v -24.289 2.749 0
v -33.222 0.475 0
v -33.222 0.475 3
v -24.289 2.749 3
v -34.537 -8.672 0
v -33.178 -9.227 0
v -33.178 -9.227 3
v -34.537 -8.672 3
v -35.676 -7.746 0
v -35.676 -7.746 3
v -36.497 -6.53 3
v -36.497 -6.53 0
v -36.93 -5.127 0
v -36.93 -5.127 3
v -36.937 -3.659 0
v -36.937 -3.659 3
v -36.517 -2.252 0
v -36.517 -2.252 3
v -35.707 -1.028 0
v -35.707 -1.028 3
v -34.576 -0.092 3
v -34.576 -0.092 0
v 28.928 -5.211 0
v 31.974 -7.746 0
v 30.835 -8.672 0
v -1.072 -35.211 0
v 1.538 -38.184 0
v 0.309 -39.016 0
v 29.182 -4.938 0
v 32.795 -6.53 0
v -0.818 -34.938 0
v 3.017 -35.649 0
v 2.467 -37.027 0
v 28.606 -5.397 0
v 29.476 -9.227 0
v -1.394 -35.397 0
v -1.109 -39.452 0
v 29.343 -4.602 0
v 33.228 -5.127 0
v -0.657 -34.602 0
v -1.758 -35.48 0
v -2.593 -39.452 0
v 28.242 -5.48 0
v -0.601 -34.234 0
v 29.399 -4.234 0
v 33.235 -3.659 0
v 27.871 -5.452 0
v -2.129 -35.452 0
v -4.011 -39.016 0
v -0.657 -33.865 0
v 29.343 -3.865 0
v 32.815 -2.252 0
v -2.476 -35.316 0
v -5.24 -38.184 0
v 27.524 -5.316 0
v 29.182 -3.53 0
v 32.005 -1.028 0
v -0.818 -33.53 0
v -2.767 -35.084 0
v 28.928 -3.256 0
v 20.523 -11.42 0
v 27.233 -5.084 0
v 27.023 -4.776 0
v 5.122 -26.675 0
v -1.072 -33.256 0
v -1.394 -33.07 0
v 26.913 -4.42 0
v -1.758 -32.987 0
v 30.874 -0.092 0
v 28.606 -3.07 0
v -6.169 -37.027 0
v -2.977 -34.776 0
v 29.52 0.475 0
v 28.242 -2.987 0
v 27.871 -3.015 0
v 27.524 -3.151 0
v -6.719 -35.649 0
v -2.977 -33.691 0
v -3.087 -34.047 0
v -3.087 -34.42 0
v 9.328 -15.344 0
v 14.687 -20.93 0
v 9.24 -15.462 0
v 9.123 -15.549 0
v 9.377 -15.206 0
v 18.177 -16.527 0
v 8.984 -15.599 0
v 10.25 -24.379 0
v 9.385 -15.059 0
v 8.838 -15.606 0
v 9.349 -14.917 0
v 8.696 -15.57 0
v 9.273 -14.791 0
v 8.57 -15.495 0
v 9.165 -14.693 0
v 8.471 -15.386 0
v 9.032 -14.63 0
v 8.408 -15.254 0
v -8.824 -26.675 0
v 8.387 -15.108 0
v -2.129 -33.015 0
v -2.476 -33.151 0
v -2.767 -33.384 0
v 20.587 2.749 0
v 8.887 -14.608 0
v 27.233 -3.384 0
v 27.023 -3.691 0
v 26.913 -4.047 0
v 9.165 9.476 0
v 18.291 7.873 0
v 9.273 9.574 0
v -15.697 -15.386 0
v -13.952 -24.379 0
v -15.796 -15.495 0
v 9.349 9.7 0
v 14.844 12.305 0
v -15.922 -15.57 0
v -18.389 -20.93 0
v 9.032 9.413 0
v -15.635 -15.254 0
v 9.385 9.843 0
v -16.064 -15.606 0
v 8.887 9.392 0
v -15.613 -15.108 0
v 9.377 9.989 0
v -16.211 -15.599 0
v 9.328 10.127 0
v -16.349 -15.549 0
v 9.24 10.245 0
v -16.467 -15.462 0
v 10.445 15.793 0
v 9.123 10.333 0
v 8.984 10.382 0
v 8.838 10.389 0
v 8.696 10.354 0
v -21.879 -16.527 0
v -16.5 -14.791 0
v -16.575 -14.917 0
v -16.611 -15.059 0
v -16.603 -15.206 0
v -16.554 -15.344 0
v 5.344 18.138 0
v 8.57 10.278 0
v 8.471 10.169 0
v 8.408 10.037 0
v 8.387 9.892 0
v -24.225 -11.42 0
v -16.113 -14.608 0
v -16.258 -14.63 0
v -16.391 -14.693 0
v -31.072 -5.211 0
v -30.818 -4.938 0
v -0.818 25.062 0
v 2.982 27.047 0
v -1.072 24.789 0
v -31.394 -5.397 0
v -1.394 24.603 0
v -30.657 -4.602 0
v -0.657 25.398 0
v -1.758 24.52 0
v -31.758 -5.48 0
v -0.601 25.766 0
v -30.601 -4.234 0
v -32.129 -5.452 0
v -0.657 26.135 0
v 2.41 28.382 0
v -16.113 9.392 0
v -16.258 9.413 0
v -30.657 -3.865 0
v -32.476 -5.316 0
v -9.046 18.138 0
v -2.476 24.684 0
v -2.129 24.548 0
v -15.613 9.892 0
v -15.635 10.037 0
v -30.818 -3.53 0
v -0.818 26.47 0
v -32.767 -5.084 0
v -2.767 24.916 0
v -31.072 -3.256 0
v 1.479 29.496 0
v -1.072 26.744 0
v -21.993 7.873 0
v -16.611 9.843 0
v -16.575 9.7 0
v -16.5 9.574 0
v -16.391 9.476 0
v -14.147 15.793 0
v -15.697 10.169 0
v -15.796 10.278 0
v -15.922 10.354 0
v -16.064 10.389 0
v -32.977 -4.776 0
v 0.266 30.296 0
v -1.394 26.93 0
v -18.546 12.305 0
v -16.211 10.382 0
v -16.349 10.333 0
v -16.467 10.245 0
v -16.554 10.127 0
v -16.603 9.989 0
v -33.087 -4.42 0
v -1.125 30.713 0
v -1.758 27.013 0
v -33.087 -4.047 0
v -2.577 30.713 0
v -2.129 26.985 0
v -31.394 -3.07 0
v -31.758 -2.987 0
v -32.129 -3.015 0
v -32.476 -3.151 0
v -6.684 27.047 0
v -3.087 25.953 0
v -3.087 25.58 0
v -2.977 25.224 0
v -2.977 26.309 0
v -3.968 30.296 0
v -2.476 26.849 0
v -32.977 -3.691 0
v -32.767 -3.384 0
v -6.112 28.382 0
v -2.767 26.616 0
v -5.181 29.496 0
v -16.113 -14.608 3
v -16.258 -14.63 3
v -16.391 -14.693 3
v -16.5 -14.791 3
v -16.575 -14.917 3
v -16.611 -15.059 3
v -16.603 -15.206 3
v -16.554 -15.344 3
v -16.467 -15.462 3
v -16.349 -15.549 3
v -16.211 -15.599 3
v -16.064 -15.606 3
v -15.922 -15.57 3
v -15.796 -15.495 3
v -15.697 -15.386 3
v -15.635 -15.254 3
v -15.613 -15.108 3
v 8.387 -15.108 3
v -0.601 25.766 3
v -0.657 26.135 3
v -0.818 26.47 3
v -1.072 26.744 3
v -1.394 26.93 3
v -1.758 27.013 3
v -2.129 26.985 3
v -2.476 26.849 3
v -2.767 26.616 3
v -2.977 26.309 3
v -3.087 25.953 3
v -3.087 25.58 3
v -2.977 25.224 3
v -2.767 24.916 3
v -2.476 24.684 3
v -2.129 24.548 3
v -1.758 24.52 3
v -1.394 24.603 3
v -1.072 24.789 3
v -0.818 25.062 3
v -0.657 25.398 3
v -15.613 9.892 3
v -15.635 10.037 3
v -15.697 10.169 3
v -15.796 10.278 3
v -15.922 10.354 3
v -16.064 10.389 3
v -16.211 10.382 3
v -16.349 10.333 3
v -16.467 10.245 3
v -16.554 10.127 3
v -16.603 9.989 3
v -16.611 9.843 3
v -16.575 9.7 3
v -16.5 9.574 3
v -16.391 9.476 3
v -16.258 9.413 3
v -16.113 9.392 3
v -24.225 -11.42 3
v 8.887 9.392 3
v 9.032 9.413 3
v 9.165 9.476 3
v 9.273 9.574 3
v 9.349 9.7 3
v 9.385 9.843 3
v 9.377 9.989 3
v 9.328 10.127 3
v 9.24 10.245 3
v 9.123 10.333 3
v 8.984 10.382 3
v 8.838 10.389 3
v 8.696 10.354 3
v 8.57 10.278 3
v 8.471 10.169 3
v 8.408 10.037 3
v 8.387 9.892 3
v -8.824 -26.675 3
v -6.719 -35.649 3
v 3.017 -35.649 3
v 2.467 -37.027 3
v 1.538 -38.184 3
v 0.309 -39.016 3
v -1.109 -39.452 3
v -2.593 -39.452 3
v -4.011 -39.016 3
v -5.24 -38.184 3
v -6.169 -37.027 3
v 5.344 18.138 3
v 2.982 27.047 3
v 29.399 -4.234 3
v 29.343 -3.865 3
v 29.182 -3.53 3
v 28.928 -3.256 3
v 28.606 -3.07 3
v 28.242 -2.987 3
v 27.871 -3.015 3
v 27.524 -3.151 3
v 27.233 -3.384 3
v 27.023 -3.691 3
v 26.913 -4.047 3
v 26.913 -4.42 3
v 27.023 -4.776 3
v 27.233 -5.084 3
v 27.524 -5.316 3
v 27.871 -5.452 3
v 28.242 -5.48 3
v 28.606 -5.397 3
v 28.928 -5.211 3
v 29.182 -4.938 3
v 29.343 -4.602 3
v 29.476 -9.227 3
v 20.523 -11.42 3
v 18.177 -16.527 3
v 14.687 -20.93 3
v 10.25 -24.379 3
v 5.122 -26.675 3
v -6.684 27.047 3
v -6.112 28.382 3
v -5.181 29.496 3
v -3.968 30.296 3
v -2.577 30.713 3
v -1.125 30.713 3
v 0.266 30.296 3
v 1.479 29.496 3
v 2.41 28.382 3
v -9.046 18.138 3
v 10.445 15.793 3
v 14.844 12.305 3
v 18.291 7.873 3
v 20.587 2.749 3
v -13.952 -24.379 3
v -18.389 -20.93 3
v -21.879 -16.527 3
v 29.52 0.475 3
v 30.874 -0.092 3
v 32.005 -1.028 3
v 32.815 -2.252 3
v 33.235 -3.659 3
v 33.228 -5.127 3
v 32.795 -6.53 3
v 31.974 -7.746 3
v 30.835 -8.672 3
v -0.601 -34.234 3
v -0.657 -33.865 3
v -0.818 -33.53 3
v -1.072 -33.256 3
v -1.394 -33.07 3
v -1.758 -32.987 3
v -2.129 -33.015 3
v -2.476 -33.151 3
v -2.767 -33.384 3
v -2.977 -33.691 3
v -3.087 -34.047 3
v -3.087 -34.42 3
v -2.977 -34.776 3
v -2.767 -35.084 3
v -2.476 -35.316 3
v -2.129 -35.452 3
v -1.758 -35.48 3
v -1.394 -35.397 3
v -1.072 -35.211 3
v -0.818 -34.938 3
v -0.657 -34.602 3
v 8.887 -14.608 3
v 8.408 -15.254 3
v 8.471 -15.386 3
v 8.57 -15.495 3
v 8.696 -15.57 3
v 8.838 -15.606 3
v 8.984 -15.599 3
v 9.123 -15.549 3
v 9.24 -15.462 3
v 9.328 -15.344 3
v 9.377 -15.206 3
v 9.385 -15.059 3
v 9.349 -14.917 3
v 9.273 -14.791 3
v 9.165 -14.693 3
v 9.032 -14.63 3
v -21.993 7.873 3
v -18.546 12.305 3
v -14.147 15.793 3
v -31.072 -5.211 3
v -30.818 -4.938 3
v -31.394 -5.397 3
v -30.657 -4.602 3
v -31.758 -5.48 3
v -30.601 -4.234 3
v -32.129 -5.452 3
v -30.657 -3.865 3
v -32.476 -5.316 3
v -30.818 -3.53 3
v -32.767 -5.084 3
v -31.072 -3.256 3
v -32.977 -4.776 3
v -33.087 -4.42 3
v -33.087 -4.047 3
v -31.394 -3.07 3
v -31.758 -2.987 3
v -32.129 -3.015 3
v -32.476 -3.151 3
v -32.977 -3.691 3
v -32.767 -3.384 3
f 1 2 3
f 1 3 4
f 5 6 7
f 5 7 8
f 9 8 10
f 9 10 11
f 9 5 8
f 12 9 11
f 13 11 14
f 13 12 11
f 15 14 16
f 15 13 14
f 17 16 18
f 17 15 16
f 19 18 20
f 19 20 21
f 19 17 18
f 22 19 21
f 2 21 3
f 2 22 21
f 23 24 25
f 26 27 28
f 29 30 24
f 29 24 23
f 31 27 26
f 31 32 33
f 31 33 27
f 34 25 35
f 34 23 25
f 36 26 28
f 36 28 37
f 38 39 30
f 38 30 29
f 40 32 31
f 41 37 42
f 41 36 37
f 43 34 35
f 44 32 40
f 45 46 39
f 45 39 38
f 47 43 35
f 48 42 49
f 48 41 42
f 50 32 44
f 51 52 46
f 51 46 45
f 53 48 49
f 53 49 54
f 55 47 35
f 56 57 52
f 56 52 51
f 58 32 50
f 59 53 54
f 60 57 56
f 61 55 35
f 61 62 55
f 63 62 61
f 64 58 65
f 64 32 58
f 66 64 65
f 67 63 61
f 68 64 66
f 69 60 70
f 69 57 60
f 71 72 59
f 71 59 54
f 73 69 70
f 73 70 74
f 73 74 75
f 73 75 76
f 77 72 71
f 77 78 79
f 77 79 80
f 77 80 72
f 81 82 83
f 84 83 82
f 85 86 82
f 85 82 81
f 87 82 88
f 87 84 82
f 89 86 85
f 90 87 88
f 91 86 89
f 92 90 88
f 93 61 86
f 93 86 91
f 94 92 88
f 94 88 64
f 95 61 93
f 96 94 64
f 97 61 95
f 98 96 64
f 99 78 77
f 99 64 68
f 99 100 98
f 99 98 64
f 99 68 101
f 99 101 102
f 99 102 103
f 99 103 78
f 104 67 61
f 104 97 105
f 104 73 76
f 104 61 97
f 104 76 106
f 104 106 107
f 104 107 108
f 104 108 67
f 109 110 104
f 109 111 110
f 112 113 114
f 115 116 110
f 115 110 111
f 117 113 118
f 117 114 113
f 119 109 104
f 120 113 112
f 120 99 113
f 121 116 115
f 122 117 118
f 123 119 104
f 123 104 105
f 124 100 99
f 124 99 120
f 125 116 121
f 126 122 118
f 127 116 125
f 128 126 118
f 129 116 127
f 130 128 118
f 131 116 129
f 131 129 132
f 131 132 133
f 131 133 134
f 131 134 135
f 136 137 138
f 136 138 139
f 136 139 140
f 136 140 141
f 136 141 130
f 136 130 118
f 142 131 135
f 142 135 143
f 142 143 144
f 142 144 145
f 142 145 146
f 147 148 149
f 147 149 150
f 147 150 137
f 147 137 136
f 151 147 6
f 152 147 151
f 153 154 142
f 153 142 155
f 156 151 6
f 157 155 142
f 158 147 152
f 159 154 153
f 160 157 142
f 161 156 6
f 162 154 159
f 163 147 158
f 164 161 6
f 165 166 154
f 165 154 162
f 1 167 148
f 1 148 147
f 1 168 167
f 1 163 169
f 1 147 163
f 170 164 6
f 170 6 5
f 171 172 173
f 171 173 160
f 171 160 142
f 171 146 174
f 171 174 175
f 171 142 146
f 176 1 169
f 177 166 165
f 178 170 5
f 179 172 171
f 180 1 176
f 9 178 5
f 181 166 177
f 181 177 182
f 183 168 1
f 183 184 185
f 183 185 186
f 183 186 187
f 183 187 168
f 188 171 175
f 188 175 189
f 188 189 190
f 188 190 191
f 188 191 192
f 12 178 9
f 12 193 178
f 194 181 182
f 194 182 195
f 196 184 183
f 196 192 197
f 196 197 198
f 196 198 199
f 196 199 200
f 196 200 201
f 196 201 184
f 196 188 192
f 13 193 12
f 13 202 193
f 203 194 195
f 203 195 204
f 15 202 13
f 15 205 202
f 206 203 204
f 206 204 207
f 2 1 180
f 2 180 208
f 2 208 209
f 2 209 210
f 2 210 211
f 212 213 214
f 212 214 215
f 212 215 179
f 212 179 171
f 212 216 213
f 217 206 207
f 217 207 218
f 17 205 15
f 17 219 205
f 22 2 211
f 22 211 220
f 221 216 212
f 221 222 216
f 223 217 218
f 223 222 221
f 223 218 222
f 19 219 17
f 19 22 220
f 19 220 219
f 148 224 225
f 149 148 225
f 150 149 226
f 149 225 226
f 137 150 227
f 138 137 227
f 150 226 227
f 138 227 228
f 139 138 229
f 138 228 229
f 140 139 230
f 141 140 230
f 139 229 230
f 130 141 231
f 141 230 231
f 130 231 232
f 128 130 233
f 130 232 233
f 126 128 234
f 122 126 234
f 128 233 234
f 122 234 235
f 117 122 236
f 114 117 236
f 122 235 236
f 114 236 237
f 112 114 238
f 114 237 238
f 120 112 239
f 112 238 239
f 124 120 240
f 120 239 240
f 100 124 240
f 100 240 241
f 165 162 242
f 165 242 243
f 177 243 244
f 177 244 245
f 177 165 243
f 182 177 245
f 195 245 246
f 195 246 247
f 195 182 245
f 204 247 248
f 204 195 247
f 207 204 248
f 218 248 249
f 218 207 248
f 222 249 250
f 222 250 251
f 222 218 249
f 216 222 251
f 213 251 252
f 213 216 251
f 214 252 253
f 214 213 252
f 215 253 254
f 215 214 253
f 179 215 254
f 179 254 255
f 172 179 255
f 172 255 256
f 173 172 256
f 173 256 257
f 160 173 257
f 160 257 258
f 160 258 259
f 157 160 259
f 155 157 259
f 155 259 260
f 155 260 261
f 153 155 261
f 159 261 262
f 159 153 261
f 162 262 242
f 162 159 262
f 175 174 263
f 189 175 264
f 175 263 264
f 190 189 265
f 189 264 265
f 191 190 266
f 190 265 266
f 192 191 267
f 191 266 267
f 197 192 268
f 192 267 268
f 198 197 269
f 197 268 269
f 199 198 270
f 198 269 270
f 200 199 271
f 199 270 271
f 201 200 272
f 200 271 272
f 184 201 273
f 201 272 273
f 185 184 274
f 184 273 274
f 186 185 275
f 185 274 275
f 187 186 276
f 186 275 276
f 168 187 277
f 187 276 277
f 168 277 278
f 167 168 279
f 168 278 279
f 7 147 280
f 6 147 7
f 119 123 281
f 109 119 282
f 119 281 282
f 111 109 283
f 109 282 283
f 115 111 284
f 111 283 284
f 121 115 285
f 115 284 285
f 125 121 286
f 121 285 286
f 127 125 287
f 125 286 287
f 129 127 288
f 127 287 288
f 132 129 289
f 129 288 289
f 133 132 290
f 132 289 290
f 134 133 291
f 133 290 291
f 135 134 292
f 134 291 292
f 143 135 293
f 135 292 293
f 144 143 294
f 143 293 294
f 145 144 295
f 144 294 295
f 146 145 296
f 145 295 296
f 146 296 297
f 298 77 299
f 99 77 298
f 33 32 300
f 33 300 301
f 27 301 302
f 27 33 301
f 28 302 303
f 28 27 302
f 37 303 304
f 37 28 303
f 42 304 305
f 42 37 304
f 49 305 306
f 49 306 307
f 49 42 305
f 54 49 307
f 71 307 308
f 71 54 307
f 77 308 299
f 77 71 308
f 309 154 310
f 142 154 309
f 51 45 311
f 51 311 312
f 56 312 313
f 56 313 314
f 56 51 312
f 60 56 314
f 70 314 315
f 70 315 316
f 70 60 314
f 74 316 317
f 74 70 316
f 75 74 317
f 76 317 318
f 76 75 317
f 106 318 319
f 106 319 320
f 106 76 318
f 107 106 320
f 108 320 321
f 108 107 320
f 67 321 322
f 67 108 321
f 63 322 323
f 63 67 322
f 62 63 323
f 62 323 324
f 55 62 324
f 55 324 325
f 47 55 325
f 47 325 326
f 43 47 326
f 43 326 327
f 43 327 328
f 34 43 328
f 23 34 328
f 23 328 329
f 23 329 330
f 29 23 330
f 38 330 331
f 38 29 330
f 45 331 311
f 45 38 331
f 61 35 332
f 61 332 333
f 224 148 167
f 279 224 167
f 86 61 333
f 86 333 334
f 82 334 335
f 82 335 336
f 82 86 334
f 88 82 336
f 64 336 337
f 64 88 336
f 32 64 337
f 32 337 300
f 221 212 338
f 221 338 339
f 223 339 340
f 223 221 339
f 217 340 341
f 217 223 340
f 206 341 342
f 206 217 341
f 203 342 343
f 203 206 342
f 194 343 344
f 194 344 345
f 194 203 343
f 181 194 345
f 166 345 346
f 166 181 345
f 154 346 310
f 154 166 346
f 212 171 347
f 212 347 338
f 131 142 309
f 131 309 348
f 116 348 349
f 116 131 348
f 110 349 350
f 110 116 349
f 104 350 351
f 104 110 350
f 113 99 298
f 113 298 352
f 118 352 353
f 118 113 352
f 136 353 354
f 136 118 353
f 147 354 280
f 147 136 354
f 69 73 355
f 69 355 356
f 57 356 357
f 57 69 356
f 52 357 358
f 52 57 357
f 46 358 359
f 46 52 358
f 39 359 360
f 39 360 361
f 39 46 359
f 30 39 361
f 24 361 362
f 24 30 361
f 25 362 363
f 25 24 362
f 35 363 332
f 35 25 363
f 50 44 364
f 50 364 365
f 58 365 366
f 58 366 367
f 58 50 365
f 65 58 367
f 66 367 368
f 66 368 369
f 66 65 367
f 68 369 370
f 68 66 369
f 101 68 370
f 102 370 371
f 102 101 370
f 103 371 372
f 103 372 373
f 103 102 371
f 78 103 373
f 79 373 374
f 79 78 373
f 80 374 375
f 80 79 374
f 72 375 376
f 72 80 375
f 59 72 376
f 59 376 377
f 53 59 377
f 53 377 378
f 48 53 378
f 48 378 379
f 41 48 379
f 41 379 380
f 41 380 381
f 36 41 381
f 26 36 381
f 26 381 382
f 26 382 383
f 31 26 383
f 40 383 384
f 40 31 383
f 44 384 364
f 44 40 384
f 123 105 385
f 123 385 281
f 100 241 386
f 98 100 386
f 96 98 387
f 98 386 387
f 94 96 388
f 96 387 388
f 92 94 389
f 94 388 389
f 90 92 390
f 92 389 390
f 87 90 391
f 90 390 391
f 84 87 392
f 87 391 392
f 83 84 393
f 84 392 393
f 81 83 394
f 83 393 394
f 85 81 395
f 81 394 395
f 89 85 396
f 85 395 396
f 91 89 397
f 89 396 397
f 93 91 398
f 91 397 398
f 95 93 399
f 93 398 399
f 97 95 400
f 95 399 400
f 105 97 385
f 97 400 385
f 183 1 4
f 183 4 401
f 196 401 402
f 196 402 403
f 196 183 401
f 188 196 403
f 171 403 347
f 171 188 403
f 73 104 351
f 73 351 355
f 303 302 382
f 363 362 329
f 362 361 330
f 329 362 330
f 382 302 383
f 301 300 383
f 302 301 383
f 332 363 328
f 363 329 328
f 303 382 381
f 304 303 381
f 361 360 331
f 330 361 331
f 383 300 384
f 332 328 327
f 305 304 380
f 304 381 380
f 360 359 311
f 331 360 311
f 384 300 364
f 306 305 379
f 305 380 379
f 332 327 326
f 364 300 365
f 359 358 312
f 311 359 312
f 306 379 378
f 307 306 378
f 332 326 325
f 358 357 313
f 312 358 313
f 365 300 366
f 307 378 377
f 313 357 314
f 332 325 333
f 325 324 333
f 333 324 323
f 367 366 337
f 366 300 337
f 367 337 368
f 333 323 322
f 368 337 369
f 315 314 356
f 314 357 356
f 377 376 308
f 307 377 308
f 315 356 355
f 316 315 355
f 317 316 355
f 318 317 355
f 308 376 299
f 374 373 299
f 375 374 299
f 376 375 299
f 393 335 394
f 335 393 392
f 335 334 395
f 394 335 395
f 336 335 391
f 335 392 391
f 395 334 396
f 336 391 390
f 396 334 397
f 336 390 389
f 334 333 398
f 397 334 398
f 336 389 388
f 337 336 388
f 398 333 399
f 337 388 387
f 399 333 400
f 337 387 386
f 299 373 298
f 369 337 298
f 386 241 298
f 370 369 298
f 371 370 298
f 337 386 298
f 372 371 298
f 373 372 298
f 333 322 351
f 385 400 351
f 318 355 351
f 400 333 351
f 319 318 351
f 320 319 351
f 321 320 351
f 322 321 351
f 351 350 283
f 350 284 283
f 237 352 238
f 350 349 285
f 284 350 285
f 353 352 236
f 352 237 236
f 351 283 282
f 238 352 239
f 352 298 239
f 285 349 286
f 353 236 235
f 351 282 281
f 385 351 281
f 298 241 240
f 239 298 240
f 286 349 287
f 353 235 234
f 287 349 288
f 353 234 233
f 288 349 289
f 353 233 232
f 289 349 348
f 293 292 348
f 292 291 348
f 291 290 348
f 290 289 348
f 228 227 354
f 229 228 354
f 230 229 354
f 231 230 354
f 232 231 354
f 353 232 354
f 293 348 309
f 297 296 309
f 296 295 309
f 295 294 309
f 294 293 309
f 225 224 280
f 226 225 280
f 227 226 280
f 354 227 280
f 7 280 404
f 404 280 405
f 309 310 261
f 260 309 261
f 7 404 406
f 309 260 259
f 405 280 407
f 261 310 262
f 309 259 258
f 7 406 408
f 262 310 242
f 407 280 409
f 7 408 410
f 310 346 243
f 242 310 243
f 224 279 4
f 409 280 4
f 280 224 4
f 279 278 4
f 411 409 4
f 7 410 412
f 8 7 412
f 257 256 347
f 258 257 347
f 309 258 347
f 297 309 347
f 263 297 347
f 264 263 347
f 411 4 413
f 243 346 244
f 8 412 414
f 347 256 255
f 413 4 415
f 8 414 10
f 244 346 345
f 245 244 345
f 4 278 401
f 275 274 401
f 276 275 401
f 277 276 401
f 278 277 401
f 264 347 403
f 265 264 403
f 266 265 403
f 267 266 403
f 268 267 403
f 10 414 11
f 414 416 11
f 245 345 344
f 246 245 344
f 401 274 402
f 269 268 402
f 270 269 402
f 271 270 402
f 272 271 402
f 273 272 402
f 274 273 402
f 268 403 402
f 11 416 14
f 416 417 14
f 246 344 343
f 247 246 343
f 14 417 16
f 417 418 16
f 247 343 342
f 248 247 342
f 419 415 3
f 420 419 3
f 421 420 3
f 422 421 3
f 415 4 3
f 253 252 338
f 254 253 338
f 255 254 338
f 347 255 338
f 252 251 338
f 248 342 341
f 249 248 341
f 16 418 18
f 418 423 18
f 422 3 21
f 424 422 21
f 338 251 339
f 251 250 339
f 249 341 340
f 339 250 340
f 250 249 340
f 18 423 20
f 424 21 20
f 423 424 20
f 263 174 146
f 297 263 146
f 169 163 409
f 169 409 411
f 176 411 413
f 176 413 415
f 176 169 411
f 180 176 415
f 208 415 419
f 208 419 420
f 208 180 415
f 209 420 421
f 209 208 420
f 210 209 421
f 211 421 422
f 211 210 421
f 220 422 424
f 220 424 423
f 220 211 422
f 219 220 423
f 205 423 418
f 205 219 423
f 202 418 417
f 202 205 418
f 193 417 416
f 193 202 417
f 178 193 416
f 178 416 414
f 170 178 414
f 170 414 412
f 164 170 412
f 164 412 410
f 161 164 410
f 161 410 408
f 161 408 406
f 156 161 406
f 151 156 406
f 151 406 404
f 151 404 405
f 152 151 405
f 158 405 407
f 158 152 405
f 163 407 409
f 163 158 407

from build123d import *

# Parameters (mm, degrees)
SKETCH1_R           = 1.25
SKETCH1_W           = 25
SKETCH1_H           = 25
BOSS_EXTRUDE1_DEPTH = 3
SKETCH2_R           = 0.5
CUT_EXTRUDE1_DEPTH  = 10


with BuildPart() as part:
    # Sketch1 → Boss-Extrude1 (new body)
    with BuildSketch(Plane.XY):
        with BuildLine():
            Line((-33.221634358, 0.474846268), (-24.289446699, 2.749498978))
            ThreePointArc((-24.289446699, 2.749498978), (-18.546247277, 12.304618098), (-9.045759802, 18.137745796))
            Line((-9.045759802, 18.137745796), (-6.684093846, 27.047322398))
            ThreePointArc((-6.684093846, 27.047322398), (-1.851003919, 30.766212818), (2.982086008, 27.047322398))
            Line((2.982086008, 27.047322398), (5.343751964, 18.137745796))
            ThreePointArc((5.343751964, 18.137745796), (14.844239439, 12.304618098), (20.587438861, 2.749498978))
            Line((20.587438861, 2.749498978), (29.51962652, 0.474846268))
            ThreePointArc((29.51962652, 0.474846268), (33.2856667, -4.393192656), (29.475612525, -9.226860909))
            Line((29.475612525, -9.226860909), (20.523154011, -11.420375867))
            ThreePointArc((20.523154011, -11.420375867), (14.686585816, -20.929838384), (5.121898214, -26.675459041))
            Line((5.121898214, -26.675459041), (3.016856108, -35.649132707))
            ThreePointArc((3.016856108, -35.649132707), (-1.851003919, -39.507231329), (-6.718863946, -35.649132707))
            Line((-6.718863946, -35.649132707), (-8.823906053, -26.675459041))
            ThreePointArc((-8.823906053, -26.675459041), (-18.388593654, -20.929838384), (-24.225161849, -11.420375867))
            Line((-24.225161849, -11.420375867), (-33.177620364, -9.226860909))
            ThreePointArc((-33.177620364, -9.226860909), (-36.987674539, -4.393192656), (-33.221634358, 0.474846268))
        make_face()
        with Locations((-1.851003919, 25.766212818)):
            Circle(SKETCH1_R, mode=Mode.SUBTRACT)
        with Locations((28.148996081, -4.233787182)):
            Circle(SKETCH1_R, mode=Mode.SUBTRACT)
        with Locations((-1.851003919, -34.233787182)):
            Circle(SKETCH1_R, mode=Mode.SUBTRACT)
        with Locations((-31.851003919, -4.233787182)):
            Circle(SKETCH1_R, mode=Mode.SUBTRACT)
        with Locations((-3.613074624, -2.60843855)):
            Rectangle(SKETCH1_W, SKETCH1_H, mode=Mode.SUBTRACT)
    extrude(amount=BOSS_EXTRUDE1_DEPTH)

    # Sketch2 → Cut-Extrude1 (cut)
    with BuildSketch(Plane.XY.offset(3)):
        with Locations((-16.113074624, 9.89156145)):
            Circle(SKETCH2_R)
        with Locations((8.886925376, 9.89156145)):
            Circle(SKETCH2_R)
        with Locations((8.886925376, -15.10843855)):
            Circle(SKETCH2_R)
        with Locations((-16.113074624, -15.10843855)):
            Circle(SKETCH2_R)
    extrude(amount=-CUT_EXTRUDE1_DEPTH, mode=Mode.SUBTRACT)


solid = part.part
